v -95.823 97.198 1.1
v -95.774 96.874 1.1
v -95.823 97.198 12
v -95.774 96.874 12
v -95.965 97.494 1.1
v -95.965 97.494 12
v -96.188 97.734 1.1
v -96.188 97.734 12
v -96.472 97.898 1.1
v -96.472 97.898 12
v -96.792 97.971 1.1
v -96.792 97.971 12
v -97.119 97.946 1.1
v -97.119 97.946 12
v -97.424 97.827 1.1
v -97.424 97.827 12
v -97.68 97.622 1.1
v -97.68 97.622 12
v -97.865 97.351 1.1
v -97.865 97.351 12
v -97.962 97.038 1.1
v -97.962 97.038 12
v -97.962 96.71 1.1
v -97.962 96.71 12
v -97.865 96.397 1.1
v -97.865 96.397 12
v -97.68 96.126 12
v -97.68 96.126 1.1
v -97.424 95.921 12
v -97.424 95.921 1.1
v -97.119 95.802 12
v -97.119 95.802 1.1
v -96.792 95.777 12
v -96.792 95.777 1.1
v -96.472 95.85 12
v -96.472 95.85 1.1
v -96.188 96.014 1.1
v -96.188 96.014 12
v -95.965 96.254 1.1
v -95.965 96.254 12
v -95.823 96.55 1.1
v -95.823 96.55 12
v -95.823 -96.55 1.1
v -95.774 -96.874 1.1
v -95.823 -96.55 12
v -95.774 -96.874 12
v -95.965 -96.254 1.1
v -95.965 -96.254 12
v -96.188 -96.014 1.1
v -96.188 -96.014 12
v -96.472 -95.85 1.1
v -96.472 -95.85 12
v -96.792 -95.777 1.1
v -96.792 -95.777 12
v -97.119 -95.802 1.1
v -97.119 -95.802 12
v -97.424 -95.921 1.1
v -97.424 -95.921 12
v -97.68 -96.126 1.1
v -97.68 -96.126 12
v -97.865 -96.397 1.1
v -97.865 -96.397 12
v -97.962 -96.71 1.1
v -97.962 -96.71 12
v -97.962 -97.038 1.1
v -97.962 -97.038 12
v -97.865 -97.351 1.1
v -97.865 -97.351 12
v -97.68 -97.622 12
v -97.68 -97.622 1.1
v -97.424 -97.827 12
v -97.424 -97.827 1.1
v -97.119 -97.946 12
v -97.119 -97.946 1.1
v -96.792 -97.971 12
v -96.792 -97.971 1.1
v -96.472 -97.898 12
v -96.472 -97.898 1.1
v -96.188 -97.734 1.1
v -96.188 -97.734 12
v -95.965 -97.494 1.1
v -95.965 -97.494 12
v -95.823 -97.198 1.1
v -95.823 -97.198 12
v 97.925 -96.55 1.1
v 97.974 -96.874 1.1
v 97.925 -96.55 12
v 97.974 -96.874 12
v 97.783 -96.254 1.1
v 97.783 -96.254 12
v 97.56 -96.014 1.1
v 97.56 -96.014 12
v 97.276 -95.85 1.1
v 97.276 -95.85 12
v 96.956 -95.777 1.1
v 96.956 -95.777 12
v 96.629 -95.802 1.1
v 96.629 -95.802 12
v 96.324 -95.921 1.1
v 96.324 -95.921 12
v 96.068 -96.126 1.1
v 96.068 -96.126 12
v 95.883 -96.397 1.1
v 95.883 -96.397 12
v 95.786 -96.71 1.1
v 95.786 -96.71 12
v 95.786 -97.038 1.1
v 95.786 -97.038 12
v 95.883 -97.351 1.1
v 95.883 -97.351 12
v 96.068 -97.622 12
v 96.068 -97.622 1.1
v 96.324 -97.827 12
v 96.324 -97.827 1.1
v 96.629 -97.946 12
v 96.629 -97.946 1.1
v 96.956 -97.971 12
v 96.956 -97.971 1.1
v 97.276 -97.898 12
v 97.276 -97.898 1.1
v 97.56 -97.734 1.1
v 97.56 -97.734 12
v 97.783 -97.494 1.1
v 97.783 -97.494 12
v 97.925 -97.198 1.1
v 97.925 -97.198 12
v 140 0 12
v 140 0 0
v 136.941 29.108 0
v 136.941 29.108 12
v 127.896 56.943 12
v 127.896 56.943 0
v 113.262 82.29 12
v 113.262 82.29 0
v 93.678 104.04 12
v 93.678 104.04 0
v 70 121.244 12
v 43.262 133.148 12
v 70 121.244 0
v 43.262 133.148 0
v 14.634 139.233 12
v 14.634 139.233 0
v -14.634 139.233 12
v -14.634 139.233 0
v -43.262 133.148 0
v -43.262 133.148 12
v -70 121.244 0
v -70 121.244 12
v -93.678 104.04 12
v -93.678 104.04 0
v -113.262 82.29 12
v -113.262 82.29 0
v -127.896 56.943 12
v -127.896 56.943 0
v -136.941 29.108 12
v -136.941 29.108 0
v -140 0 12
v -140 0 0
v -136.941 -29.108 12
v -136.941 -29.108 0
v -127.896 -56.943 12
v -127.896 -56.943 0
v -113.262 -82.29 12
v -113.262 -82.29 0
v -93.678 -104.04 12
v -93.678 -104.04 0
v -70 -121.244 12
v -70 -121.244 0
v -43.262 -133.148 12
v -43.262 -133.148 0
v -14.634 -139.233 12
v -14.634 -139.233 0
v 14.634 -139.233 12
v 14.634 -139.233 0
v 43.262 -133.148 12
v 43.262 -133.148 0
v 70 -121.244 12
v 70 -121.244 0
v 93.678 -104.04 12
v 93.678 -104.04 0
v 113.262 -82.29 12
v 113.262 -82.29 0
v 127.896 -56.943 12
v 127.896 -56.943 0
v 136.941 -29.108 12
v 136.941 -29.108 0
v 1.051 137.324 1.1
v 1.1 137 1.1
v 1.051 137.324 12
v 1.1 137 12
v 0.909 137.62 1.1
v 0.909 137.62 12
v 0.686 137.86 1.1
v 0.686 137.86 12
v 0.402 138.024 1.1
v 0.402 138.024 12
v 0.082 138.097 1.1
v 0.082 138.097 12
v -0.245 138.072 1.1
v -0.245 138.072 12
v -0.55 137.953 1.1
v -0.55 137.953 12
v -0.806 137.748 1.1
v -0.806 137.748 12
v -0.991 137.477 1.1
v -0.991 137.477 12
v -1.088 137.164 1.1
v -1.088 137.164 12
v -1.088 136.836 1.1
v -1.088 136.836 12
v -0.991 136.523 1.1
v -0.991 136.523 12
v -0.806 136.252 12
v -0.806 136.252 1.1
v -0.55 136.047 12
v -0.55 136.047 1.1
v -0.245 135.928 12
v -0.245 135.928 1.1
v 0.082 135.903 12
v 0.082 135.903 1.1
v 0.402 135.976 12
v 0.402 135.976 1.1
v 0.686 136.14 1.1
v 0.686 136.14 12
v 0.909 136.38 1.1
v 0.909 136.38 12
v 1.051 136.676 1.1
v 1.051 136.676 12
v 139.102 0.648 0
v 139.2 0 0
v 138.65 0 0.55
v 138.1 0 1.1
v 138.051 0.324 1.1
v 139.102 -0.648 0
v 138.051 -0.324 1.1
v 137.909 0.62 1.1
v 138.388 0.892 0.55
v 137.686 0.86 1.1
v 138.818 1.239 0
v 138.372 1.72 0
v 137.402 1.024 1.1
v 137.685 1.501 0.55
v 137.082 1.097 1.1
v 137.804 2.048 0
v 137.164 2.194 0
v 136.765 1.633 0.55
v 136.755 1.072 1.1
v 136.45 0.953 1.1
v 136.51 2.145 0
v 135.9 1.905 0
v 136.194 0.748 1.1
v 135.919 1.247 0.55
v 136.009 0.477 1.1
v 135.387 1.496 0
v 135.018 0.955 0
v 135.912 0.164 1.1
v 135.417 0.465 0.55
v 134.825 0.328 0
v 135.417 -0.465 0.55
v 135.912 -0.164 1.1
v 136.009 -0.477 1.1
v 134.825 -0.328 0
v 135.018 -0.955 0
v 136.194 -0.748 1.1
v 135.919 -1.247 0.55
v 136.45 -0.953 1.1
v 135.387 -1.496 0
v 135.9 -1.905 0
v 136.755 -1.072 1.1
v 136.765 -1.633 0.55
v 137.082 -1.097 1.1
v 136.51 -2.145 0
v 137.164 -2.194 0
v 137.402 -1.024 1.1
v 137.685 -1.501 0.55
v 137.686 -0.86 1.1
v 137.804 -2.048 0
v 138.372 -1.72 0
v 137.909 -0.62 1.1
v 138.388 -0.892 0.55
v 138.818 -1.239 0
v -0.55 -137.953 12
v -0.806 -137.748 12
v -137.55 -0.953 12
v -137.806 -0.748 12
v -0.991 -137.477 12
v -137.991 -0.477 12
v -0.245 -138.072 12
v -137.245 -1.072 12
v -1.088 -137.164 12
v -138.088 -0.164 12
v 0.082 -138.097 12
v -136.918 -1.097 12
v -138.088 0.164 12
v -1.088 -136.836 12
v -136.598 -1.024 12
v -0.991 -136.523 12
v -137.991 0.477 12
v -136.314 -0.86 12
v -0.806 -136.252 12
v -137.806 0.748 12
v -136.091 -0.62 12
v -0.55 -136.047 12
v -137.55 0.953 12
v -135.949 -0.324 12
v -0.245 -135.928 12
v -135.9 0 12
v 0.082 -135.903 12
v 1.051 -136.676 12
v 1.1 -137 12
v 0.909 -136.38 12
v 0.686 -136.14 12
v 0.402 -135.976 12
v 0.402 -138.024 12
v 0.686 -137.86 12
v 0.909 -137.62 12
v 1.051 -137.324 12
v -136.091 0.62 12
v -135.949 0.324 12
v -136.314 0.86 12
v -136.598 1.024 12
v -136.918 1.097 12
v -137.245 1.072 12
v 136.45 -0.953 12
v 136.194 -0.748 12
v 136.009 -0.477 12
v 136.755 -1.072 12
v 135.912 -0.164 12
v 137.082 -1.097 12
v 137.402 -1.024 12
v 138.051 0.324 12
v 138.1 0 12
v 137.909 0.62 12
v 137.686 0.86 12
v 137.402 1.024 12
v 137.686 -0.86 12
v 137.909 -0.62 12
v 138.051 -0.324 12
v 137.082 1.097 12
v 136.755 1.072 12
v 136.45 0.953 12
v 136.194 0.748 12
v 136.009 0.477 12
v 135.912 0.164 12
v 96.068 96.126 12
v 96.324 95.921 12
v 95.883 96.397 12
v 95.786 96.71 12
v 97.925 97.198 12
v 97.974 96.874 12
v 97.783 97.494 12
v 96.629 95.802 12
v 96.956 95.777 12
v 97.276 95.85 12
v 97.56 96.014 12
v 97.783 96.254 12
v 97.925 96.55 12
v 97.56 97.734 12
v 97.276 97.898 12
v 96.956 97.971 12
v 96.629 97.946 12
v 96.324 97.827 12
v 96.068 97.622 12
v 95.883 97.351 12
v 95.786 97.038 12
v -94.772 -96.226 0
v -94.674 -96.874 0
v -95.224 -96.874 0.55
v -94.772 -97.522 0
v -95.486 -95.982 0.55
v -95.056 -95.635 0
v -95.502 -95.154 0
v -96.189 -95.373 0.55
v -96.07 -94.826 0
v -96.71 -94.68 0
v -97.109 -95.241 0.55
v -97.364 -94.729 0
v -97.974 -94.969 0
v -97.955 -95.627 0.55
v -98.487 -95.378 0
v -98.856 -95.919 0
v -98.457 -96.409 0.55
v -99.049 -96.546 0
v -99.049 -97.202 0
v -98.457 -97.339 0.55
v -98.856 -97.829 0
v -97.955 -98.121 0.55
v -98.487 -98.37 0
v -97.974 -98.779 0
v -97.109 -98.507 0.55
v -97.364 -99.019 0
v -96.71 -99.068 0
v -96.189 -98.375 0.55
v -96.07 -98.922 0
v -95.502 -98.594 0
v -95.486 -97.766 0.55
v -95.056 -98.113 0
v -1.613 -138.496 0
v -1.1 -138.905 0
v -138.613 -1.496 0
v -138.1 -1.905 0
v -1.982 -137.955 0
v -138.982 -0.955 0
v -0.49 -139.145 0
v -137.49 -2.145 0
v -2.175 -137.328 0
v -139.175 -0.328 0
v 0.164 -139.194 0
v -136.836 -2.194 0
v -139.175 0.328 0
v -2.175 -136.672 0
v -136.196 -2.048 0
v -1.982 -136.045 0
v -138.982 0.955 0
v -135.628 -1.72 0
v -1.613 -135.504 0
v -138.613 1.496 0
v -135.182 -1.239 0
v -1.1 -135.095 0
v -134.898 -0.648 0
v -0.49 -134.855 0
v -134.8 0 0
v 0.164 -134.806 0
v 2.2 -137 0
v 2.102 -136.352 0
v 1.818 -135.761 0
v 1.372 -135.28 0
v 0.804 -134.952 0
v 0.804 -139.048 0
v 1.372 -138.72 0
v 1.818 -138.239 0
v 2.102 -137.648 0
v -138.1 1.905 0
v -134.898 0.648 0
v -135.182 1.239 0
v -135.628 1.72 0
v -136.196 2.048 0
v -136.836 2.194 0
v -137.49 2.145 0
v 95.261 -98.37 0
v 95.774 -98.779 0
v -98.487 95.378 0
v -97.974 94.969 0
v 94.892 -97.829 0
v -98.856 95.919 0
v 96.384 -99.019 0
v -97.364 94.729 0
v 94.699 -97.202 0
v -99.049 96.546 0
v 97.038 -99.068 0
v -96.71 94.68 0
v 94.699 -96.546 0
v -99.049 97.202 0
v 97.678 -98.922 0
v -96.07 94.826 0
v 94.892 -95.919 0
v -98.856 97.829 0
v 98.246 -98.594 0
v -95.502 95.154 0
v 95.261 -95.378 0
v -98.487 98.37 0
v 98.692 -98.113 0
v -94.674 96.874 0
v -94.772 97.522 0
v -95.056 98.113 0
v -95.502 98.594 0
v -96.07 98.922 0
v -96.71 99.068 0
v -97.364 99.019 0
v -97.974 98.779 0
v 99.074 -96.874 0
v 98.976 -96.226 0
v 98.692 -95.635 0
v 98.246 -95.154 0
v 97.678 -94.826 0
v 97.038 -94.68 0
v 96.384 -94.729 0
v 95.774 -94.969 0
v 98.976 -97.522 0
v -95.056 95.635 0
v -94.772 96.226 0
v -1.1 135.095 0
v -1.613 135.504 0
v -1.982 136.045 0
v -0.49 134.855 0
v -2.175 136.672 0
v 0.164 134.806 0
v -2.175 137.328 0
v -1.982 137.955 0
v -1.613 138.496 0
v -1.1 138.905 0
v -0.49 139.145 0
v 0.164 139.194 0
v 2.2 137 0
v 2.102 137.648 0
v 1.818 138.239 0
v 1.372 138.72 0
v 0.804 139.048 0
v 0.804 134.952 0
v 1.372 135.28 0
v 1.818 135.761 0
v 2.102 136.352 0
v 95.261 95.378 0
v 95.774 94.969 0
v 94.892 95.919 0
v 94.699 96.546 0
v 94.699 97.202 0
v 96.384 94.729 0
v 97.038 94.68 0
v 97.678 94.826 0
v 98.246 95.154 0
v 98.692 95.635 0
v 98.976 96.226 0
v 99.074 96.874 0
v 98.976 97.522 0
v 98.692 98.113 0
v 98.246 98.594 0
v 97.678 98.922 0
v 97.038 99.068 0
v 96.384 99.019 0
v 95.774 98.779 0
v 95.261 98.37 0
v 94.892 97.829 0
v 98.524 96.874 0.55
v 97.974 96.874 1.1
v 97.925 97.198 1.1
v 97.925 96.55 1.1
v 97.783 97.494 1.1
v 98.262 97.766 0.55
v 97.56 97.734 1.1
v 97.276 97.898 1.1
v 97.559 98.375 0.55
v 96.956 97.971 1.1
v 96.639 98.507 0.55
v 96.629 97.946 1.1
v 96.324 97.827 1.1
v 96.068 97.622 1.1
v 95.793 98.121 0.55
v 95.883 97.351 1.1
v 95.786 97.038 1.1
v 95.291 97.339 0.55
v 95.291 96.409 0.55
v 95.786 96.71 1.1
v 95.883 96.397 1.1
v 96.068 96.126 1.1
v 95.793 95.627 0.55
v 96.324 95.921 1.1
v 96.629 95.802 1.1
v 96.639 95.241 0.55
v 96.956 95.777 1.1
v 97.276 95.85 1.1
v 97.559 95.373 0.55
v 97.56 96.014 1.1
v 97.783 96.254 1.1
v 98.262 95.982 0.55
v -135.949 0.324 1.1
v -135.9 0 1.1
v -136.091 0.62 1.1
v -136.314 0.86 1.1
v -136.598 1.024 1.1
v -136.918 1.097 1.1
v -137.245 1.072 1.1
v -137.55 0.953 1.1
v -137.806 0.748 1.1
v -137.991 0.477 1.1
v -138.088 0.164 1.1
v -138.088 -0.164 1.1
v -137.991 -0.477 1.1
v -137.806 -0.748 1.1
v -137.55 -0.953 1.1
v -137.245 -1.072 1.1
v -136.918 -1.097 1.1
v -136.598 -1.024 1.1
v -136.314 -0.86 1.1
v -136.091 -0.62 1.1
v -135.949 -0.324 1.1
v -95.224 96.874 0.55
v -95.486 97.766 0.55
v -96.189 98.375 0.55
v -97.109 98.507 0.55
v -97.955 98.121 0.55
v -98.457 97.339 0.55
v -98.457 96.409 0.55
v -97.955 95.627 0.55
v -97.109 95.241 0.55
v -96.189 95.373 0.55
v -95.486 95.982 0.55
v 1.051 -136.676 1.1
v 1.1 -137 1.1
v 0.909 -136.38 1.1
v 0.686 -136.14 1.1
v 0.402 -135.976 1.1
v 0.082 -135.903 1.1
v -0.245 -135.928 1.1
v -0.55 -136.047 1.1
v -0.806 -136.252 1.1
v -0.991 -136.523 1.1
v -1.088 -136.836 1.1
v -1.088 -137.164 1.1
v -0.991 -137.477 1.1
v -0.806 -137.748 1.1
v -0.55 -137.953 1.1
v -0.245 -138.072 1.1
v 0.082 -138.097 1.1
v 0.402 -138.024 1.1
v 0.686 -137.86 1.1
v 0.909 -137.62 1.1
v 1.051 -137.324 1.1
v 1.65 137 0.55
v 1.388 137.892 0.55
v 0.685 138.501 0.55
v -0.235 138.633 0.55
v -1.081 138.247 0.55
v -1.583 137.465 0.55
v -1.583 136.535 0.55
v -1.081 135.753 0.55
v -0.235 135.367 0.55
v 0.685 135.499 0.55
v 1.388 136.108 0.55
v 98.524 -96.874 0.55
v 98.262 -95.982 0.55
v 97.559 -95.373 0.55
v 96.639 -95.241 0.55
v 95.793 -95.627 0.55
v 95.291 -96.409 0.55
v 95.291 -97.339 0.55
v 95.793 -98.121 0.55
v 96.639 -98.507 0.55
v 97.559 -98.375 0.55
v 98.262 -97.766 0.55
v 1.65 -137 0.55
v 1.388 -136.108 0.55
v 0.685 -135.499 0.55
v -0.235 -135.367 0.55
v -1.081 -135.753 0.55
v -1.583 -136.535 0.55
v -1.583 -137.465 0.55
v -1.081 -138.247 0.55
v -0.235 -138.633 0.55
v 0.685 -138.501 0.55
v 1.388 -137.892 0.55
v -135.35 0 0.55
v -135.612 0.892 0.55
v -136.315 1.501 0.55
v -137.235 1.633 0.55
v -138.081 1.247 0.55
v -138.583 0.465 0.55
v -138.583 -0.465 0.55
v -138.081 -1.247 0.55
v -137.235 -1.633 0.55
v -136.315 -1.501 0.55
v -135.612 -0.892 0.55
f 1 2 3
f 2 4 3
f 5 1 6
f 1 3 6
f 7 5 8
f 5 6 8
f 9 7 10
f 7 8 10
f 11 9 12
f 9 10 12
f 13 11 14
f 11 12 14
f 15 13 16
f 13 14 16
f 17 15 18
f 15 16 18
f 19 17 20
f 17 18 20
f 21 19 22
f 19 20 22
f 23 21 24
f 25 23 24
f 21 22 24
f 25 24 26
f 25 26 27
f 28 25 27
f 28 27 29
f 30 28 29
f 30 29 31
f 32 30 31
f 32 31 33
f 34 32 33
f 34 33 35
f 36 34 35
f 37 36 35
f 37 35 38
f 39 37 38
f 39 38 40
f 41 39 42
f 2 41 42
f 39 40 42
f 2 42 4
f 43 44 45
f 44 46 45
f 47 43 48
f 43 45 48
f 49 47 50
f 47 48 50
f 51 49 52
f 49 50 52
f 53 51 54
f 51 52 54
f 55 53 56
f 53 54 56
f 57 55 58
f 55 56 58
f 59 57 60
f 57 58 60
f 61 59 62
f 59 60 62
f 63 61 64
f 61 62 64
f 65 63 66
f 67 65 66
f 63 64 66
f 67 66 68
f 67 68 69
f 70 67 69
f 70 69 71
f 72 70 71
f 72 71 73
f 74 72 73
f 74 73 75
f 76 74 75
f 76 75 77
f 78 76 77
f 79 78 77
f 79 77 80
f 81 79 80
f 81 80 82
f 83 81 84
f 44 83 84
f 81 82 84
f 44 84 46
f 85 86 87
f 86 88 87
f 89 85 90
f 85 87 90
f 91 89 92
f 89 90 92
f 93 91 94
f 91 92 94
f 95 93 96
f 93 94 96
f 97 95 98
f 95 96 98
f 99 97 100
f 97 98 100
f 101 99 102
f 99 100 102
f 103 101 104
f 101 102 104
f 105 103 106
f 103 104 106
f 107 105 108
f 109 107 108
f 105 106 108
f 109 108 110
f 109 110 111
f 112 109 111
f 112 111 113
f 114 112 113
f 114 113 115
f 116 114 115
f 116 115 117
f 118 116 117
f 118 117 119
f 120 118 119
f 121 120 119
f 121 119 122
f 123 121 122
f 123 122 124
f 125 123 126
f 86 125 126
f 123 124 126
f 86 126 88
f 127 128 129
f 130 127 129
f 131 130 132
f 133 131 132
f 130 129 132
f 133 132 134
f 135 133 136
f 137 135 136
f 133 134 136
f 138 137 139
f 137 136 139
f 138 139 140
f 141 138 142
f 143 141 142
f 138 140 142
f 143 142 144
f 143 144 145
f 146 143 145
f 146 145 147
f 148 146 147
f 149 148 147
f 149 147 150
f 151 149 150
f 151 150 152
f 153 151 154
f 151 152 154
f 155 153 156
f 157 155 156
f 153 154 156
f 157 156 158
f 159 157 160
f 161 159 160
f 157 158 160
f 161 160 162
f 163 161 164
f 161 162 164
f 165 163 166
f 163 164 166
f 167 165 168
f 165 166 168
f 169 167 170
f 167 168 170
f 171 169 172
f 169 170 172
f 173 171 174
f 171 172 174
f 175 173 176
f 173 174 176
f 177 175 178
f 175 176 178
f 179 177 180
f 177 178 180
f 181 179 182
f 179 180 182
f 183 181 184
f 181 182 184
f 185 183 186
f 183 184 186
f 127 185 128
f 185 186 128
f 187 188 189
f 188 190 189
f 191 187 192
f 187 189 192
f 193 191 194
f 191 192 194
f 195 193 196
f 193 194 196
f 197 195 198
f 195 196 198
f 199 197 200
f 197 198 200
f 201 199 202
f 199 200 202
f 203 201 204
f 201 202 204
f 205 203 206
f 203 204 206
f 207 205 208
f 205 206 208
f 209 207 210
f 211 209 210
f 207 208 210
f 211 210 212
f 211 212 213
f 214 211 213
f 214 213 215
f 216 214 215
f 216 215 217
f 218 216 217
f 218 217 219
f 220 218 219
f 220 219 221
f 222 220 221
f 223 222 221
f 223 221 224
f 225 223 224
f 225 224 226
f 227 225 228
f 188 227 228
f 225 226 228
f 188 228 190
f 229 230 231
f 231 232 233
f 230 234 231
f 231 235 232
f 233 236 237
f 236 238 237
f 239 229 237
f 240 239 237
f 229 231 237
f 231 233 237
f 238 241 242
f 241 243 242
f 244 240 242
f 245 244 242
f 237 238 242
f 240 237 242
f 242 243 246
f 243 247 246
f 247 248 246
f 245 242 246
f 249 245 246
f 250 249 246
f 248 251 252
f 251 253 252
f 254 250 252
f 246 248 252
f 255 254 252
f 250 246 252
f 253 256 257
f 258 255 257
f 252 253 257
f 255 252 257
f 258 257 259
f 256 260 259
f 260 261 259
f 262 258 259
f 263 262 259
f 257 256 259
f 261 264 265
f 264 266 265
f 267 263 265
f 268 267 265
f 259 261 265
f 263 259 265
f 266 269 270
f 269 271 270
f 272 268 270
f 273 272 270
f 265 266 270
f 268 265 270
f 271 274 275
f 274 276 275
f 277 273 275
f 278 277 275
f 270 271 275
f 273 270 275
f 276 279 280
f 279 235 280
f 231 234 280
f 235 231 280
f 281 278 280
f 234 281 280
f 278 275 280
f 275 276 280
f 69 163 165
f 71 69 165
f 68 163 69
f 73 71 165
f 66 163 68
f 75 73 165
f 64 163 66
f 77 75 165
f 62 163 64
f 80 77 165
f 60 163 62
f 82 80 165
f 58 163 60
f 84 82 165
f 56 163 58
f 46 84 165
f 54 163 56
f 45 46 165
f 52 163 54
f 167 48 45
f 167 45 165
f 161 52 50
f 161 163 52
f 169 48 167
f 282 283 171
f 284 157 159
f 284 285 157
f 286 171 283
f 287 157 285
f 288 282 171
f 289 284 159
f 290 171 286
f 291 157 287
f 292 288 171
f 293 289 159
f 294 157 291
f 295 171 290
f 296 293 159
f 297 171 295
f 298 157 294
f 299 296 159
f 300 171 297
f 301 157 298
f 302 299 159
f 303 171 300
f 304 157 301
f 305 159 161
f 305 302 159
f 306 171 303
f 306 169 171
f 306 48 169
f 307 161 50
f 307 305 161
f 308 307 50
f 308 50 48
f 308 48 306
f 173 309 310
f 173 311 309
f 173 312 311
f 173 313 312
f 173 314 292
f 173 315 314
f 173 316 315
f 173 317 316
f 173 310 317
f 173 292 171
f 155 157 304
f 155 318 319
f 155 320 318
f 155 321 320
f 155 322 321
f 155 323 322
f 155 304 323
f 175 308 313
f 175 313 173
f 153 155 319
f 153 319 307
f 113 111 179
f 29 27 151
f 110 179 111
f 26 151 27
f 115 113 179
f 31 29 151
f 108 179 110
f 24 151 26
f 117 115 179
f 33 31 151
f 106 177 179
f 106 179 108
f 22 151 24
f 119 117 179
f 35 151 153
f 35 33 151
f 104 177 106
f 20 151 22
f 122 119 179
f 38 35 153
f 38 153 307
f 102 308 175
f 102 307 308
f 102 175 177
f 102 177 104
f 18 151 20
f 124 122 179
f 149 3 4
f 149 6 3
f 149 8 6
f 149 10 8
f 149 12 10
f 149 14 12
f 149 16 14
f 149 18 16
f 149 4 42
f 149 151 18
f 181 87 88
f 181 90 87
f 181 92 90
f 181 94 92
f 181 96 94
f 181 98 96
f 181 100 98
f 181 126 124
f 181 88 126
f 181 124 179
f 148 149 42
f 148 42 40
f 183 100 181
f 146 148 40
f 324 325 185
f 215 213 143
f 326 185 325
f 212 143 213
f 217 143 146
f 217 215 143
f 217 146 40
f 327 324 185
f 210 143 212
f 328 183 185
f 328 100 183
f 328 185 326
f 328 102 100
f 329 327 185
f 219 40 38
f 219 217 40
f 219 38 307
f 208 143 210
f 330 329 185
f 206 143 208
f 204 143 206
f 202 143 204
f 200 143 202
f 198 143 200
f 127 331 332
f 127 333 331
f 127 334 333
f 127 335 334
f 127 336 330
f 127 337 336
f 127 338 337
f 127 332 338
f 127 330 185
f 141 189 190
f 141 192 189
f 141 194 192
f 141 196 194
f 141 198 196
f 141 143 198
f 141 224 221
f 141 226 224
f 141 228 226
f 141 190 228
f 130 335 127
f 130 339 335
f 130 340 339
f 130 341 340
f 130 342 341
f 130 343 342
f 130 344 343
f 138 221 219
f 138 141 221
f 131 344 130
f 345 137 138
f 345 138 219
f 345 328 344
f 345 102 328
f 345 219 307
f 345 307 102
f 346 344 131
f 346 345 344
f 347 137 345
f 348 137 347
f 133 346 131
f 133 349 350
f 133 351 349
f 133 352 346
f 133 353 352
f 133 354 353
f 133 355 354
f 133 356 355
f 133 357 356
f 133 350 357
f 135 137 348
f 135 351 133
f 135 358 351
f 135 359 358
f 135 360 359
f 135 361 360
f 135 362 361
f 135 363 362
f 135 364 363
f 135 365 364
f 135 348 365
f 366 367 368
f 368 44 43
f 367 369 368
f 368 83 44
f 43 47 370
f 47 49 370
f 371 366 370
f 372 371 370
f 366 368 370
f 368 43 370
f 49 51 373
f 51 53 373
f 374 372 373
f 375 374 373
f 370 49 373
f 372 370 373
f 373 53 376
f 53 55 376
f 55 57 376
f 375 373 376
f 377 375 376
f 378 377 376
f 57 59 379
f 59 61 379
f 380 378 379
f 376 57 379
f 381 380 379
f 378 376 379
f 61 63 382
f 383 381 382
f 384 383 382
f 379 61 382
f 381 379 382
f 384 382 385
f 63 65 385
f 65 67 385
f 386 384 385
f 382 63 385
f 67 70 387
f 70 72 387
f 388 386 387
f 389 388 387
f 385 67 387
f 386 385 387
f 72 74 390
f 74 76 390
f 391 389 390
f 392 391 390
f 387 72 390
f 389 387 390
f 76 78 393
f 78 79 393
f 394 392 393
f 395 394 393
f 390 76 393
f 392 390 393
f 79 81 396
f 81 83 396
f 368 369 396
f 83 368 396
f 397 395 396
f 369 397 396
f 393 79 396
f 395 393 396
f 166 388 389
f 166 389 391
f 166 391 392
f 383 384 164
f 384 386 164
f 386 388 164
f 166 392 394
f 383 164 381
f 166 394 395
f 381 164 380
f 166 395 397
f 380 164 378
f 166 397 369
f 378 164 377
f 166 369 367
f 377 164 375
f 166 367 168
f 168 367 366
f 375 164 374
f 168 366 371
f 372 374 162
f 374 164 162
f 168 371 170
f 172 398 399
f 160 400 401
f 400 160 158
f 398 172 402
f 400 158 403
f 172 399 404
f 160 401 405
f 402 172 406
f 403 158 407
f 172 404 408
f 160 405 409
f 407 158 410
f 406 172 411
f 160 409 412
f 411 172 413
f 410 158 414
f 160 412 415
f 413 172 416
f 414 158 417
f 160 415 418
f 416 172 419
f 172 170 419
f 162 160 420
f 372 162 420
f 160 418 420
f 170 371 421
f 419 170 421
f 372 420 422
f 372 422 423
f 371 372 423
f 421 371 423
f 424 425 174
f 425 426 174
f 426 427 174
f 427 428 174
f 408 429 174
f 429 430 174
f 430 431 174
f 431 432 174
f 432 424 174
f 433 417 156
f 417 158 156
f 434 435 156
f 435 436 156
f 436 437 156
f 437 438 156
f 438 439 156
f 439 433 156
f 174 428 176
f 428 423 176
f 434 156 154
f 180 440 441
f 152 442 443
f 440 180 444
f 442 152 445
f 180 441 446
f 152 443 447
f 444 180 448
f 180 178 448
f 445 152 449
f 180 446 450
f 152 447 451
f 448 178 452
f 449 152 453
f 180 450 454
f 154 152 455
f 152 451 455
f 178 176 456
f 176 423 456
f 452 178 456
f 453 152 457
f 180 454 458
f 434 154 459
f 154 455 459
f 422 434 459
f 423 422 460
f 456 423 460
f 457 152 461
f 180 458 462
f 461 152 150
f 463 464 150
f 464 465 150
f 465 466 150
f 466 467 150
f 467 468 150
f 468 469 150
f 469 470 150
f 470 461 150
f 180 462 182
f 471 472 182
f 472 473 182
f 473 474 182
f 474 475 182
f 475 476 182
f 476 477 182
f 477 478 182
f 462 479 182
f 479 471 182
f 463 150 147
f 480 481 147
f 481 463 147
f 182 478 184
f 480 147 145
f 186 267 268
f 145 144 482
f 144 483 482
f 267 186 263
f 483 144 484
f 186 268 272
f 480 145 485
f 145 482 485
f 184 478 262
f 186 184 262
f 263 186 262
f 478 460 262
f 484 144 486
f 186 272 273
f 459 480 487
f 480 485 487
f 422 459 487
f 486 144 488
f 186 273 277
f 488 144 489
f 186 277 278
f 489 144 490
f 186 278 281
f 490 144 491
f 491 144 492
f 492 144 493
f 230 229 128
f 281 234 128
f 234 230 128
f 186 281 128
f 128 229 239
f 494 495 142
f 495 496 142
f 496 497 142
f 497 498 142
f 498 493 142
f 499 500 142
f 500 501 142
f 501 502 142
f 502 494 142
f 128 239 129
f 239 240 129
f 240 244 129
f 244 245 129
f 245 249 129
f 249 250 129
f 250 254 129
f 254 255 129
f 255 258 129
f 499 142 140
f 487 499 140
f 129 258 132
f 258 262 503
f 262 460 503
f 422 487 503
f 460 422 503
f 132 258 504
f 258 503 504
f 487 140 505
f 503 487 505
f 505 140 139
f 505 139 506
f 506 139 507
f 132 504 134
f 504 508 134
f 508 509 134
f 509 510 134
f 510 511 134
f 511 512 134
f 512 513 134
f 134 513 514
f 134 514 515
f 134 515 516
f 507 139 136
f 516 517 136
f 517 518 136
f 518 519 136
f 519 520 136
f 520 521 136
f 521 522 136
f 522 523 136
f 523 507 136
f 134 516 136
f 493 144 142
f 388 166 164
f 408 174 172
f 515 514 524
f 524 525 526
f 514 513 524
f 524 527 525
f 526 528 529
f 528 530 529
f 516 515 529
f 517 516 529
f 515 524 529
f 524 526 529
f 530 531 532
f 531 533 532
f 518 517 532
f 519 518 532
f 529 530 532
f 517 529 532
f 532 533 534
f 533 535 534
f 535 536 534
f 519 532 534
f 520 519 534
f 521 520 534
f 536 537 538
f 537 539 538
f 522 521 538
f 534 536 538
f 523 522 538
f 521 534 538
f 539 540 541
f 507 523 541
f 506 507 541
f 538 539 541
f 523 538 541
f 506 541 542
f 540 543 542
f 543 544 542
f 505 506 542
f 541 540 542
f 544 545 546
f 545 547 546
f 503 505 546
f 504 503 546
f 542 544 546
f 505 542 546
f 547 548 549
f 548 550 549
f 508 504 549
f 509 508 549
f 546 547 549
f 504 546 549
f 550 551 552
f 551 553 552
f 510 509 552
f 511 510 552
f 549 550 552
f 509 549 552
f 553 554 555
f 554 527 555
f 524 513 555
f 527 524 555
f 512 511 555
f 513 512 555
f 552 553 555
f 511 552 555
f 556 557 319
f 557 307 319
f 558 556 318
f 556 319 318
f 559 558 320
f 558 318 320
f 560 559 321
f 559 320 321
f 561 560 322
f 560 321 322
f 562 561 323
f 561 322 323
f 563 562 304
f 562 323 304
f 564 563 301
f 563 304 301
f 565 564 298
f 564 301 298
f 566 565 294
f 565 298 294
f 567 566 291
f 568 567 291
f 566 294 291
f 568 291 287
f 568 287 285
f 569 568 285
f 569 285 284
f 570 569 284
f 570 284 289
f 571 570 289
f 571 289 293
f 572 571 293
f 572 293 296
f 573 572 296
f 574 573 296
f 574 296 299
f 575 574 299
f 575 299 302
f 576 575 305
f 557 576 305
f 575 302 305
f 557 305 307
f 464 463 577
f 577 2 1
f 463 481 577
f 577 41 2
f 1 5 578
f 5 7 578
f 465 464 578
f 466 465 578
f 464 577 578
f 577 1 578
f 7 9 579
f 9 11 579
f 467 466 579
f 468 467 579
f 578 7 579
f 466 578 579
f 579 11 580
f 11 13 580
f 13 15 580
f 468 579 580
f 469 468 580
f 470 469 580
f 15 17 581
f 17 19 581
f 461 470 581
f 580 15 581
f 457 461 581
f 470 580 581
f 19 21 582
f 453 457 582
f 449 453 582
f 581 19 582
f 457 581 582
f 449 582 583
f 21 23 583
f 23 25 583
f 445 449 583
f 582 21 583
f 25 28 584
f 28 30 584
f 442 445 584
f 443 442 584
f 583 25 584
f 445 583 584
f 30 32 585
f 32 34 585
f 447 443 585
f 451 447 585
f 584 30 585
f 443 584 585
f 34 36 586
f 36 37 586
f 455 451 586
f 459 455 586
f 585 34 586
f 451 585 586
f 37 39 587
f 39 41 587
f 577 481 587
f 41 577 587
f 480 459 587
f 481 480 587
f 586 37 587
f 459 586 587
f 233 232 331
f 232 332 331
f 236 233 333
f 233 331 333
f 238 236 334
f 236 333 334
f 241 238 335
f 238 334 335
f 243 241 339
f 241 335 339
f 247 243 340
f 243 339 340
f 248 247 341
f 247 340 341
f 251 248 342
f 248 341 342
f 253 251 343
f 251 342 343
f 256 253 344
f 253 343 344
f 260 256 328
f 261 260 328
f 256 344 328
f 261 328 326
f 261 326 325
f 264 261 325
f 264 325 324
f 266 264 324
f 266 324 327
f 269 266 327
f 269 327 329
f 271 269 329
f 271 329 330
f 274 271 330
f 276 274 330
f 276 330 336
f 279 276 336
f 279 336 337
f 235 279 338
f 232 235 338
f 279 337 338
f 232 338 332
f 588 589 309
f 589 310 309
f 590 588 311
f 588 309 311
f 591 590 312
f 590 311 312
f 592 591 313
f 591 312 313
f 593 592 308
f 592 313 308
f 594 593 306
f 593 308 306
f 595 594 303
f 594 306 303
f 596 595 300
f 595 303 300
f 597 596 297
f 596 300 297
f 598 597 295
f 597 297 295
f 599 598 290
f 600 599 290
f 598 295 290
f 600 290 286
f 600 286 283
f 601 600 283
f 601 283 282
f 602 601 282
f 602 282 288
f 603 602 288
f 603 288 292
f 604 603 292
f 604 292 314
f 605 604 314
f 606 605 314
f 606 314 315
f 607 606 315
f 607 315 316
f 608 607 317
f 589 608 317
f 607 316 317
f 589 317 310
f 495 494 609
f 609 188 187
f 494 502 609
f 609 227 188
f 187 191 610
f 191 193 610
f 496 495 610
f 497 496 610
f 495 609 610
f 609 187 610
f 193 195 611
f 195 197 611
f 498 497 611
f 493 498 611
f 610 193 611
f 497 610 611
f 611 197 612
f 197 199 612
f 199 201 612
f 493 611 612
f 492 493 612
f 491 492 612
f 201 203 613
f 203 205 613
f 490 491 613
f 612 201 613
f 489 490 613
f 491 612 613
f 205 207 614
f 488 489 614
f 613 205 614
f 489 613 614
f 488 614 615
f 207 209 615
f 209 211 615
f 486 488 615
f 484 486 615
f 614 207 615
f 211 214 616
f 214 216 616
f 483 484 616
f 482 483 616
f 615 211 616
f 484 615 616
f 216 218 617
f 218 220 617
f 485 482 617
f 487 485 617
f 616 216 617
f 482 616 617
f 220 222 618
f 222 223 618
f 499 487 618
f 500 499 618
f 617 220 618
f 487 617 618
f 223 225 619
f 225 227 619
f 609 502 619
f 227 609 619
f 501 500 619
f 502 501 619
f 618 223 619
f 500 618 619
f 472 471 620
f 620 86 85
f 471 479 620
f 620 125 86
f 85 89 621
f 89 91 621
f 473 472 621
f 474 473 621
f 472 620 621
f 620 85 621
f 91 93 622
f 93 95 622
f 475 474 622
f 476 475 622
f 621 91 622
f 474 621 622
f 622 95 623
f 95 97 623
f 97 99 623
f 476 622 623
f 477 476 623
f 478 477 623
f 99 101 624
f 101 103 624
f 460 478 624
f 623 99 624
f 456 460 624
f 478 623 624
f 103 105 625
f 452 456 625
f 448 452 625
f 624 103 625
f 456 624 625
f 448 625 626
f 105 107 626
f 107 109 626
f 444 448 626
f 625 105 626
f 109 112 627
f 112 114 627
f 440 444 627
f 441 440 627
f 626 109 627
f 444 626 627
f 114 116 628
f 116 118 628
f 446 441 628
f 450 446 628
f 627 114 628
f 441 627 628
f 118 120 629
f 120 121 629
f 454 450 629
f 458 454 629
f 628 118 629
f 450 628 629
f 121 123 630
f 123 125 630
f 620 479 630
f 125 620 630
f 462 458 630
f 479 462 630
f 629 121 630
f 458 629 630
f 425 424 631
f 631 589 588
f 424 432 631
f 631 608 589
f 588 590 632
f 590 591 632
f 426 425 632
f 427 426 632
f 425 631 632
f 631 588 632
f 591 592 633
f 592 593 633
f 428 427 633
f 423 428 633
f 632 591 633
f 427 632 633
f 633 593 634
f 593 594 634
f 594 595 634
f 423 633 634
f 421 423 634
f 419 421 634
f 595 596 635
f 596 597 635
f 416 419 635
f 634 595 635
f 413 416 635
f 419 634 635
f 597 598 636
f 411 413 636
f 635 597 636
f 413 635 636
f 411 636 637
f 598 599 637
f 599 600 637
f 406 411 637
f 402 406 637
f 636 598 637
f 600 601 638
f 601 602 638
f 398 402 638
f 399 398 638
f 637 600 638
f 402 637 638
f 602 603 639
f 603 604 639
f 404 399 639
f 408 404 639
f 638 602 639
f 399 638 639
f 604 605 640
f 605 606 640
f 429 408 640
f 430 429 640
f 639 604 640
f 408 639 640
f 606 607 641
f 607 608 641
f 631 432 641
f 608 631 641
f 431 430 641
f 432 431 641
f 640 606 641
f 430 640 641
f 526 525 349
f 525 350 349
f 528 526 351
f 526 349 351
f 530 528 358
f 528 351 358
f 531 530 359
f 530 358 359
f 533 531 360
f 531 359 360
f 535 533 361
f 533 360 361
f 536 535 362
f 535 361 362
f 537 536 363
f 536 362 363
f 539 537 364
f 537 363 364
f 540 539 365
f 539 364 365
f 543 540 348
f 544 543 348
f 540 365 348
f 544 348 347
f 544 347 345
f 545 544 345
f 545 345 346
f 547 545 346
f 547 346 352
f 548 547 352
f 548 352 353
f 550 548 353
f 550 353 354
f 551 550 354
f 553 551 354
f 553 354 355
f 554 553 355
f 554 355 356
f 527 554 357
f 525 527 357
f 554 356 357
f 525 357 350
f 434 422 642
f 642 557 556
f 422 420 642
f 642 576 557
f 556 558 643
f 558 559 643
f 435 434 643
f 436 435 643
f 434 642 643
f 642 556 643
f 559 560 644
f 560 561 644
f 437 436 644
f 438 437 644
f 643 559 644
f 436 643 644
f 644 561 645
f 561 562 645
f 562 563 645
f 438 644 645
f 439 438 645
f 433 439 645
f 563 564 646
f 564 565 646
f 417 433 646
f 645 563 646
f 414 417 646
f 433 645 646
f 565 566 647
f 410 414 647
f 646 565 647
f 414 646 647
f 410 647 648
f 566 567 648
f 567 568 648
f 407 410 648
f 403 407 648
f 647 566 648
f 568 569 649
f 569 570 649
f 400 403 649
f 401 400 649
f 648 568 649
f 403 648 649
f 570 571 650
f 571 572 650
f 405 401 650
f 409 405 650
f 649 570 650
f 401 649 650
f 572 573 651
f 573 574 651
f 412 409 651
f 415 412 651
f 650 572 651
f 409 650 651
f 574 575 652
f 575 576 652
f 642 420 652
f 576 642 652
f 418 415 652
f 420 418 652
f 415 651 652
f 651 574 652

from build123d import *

# Parameters (mm, degrees)
SKETCH1_R                                       = 140
BOSS_EXTRUDE1_DEPTH                             = 12
CSK_FOR_M2_FLAT_HEAD_MACHINE_SCREW1_D           = 2.2
CSK_FOR_M2_FLAT_HEAD_MACHINE_SCREW1_CSINK_D     = 4.4
CSK_FOR_M2_FLAT_HEAD_MACHINE_SCREW1_CSINK_ANGLE = 90


with BuildPart() as part:
    # Sketch1 → Boss-Extrude1 (new body)
    with BuildSketch(Plane.XY):
        Circle(SKETCH1_R)
    extrude(amount=BOSS_EXTRUDE1_DEPTH)

    # CSK for M2 Flat Head Machine Screw1 (through all)
    with Locations(Plane(origin=(0, 0, 0), x_dir=(-1, 0, 0), z_dir=(0, 0, -1))):
        with Locations((0, 137), (137, 0), (0, -137), (-137, 0), (-96.874, 96.874), (96.874, 96.874), (96.874, -96.874), (-96.874, -96.874)):
            CounterSinkHole(CSK_FOR_M2_FLAT_HEAD_MACHINE_SCREW1_D / 2, CSK_FOR_M2_FLAT_HEAD_MACHINE_SCREW1_CSINK_D / 2, counter_sink_angle=CSK_FOR_M2_FLAT_HEAD_MACHINE_SCREW1_CSINK_ANGLE)


solid = part.part
